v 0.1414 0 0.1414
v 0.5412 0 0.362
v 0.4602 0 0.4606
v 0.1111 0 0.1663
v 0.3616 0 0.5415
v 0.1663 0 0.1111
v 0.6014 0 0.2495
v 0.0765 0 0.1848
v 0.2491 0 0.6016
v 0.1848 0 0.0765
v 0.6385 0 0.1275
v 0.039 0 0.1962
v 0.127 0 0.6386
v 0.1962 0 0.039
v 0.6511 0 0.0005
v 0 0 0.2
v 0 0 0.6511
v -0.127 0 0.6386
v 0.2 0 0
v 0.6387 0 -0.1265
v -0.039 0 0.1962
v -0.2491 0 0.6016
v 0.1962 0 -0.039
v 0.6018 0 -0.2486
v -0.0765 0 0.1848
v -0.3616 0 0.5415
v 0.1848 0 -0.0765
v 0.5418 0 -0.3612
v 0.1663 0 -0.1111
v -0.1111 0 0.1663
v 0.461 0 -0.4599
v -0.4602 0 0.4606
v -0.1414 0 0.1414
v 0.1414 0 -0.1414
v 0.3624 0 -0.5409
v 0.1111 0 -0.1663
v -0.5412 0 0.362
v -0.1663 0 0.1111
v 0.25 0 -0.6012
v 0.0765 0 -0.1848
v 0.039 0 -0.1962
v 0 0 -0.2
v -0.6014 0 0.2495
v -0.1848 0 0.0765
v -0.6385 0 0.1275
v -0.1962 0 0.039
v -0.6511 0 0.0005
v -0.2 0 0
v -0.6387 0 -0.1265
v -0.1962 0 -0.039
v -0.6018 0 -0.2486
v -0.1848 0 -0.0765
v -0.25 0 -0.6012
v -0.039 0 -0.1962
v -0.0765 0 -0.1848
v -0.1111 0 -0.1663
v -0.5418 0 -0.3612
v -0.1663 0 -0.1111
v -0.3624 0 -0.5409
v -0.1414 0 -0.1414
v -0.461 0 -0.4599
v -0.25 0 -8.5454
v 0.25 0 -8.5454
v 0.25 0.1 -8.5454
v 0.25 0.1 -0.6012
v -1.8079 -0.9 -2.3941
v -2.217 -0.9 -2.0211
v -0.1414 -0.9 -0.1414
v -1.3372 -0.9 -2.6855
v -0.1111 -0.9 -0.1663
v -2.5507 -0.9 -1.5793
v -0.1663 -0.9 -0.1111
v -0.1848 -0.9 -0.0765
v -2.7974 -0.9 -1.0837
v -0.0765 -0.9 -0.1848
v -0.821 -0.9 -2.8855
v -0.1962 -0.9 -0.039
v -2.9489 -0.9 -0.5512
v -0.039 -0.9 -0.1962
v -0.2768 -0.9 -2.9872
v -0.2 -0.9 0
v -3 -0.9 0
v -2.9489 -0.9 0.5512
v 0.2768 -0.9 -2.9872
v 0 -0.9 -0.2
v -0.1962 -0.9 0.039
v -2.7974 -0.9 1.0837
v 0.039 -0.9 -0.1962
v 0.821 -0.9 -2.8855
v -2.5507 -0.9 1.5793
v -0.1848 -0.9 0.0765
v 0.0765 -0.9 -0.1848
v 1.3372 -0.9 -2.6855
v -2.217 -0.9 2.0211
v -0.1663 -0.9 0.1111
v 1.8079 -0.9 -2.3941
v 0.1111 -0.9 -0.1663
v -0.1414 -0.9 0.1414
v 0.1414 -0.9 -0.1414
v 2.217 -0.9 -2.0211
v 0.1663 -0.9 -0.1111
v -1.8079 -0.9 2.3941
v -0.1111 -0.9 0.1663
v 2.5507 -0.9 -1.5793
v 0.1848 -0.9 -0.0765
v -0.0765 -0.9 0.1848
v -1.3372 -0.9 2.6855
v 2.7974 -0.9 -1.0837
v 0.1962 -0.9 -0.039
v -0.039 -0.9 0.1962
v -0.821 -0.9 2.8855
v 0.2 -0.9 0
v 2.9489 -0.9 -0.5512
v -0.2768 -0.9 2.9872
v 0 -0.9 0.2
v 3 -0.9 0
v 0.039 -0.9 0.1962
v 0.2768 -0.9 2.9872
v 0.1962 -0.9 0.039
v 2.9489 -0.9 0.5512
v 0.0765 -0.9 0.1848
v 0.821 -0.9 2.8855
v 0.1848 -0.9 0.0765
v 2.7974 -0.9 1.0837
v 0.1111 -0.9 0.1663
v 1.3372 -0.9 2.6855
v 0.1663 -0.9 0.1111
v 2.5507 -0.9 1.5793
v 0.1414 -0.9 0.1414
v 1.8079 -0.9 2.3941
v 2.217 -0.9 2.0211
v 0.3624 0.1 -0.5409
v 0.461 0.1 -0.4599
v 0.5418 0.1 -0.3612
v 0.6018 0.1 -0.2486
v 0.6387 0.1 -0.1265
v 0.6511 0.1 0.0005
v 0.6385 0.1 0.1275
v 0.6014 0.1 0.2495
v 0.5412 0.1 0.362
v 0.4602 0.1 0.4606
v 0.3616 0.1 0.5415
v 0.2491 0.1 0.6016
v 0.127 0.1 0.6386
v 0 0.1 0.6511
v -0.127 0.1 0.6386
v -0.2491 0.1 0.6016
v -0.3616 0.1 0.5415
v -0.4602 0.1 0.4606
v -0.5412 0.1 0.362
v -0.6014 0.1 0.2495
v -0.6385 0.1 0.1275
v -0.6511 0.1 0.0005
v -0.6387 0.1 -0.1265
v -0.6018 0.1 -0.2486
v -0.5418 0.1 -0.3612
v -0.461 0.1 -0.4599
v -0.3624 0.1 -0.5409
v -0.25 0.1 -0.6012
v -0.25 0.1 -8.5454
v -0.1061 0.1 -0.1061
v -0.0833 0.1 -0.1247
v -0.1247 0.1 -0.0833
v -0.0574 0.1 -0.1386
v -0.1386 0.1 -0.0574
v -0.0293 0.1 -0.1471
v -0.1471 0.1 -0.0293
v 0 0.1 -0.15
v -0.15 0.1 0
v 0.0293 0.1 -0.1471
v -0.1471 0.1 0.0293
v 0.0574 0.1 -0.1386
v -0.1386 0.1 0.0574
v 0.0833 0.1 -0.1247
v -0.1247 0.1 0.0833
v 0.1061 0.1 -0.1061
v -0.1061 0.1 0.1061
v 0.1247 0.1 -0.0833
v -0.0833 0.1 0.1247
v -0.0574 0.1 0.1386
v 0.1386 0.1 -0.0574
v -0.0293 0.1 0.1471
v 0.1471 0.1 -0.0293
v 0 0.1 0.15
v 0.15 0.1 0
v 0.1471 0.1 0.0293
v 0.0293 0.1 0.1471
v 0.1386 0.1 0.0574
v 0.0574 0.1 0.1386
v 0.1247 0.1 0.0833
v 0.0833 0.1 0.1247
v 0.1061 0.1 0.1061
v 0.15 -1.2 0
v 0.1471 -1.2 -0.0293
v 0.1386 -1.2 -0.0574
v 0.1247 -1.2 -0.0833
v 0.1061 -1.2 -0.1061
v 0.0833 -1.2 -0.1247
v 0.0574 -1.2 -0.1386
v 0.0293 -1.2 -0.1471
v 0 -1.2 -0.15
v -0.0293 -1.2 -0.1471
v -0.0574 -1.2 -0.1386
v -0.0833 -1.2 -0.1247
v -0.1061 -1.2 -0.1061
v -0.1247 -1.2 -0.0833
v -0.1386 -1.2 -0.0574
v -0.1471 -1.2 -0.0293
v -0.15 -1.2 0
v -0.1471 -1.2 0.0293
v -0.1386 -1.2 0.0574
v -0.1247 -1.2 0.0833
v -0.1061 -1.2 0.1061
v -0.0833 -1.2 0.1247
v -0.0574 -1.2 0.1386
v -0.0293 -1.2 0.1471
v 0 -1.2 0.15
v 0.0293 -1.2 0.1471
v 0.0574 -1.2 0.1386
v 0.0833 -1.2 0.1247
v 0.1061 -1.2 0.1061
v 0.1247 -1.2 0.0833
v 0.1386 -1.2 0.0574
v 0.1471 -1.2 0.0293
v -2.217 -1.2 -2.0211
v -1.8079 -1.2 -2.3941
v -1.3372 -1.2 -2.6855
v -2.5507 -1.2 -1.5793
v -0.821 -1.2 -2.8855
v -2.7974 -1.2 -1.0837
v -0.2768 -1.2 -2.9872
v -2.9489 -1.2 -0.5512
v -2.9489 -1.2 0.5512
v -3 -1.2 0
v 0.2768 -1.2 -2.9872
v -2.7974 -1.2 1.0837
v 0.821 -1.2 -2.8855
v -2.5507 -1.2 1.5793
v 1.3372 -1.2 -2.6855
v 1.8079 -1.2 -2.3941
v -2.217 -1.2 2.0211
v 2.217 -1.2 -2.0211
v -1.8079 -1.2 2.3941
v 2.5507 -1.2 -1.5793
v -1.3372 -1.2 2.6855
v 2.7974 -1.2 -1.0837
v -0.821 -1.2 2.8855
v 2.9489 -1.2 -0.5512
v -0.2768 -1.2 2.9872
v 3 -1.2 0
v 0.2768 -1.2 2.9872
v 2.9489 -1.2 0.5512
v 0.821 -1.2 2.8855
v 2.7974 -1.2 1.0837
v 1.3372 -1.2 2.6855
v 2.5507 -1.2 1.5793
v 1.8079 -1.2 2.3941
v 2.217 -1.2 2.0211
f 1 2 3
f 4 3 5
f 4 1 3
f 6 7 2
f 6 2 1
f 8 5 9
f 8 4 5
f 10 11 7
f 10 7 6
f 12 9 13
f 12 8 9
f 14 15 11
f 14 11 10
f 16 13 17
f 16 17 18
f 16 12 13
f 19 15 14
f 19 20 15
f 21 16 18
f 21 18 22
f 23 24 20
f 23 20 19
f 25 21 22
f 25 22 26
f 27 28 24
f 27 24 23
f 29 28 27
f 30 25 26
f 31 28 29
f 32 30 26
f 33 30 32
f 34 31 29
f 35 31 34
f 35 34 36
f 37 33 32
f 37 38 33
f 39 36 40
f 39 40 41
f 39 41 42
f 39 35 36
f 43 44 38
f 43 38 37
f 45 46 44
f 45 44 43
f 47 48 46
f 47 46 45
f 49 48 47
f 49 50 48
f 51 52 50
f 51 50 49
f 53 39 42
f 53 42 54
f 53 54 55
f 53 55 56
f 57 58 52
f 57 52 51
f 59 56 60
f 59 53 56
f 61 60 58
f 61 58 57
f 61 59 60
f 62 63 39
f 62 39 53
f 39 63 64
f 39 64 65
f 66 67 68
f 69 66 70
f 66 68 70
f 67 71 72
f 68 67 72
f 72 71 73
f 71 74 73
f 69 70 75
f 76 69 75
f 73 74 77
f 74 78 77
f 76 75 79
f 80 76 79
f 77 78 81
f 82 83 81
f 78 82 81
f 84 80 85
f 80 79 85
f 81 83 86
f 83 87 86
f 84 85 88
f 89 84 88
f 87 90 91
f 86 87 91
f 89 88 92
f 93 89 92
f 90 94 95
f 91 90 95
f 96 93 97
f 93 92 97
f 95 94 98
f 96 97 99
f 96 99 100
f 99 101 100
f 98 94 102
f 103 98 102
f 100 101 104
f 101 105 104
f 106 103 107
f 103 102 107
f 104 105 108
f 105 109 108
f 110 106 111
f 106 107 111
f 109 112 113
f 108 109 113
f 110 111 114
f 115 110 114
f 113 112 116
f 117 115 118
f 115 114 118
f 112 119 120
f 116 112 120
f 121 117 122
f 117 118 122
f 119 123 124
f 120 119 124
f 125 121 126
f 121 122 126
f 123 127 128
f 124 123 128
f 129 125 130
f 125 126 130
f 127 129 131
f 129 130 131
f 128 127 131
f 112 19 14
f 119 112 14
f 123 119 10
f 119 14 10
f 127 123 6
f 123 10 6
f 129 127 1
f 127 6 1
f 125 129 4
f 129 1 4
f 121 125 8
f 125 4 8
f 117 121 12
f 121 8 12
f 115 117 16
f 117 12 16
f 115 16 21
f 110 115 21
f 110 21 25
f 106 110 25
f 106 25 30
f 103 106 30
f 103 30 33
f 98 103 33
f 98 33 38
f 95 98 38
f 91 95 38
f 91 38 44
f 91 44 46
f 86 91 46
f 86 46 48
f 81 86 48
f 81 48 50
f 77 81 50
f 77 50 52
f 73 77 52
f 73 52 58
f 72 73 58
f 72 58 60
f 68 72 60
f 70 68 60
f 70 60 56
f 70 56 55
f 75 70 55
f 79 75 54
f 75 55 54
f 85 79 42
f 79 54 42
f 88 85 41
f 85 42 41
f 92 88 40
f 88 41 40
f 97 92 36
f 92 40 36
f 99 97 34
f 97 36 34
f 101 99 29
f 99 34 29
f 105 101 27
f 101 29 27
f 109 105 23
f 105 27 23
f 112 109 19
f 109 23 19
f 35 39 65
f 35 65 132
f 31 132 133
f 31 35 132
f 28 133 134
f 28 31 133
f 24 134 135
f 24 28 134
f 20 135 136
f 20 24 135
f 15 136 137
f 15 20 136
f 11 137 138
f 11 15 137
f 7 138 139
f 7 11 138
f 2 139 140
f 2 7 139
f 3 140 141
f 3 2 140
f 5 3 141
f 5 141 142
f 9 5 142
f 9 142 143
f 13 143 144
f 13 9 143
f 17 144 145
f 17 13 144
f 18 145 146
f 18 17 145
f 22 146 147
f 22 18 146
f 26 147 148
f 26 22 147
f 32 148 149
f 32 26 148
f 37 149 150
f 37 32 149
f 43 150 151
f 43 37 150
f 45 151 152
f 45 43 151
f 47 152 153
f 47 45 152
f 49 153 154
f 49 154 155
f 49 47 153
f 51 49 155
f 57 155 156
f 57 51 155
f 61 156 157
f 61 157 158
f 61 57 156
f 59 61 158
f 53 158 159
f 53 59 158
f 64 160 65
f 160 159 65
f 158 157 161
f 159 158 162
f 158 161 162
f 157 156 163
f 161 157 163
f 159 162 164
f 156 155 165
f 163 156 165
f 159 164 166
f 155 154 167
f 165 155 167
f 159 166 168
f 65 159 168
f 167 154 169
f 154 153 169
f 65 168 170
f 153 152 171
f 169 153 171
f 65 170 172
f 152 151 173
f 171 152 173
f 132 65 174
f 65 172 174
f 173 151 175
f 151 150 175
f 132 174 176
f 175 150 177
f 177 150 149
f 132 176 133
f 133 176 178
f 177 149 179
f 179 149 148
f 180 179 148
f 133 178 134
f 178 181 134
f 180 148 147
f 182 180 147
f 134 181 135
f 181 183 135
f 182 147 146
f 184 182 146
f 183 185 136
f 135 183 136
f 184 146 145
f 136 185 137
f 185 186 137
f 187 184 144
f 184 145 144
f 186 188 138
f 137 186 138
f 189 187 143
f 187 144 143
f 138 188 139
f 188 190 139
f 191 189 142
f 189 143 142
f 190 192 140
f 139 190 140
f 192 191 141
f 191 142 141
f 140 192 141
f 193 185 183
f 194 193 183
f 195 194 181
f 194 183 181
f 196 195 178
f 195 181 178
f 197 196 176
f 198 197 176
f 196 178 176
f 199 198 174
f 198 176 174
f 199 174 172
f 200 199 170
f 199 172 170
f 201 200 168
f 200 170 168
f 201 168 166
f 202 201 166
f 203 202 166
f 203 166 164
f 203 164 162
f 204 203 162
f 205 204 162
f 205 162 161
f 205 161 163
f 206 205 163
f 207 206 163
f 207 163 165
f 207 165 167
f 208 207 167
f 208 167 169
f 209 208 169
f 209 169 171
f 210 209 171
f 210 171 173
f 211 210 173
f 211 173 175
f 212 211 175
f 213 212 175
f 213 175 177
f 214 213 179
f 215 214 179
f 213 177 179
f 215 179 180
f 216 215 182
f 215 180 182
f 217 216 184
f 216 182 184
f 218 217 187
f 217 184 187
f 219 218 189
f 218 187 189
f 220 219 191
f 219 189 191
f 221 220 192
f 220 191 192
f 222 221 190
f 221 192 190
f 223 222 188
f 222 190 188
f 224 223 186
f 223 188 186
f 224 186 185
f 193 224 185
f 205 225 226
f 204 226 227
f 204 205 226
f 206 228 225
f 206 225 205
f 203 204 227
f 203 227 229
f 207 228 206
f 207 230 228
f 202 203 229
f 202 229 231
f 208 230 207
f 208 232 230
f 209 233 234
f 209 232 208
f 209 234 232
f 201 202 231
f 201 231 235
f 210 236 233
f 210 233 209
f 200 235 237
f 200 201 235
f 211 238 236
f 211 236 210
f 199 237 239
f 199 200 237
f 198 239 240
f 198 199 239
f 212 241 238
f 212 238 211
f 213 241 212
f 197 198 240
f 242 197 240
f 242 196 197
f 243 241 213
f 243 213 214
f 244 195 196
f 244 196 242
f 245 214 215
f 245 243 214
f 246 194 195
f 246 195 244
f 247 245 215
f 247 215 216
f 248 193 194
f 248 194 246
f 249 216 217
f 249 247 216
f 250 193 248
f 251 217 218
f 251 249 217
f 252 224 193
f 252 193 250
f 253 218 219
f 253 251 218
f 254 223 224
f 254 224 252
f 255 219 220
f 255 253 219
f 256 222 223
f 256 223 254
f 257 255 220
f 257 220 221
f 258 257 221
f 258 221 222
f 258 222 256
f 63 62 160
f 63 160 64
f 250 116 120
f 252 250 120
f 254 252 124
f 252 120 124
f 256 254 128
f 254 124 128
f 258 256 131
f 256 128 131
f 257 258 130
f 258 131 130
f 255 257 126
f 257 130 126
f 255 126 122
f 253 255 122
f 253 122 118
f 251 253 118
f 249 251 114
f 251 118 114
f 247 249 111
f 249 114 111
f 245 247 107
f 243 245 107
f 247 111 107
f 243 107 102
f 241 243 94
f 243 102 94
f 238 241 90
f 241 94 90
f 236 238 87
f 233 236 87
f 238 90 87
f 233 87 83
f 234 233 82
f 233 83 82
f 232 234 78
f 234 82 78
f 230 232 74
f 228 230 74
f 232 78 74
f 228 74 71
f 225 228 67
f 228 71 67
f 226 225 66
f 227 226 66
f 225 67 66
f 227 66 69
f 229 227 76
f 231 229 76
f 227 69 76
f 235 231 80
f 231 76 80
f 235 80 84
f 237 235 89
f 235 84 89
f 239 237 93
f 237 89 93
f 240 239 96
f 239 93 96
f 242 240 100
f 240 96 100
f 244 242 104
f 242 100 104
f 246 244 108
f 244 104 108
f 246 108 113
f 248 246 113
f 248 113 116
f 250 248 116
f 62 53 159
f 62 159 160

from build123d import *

# Parameters (mm, degrees)
BOSS_EXTRUDE1_DEPTH = 0.1
SKETCH2_R           = 0.2
BOSS_EXTRUDE2_DEPTH = 1
SKETCH3_R           = 3
BOSS_EXTRUDE3_DEPTH = 0.3
SKETCH4_R           = 0.15
CUT_EXTRUDE1_DEPTH  = 2.3


with BuildPart() as part:
    # Sketch1 → Boss-Extrude1 (new body)
    with BuildSketch(Plane(origin=(0, 0, 0), x_dir=(1, 0, 0), z_dir=(0, 1, 0))):
        with BuildLine():
            Line((-0.25, 8.545435606), (0.25, 8.545435606))
            Line((0.25, 8.545435606), (0.25, 0.601234649))
            ThreePointArc((0.25, 0.601234649), (0, -0.651139849), (-0.25, 0.601234649))
            Line((-0.25, 0.601234649), (-0.25, 8.545435606))
        make_face()
    extrude(amount=BOSS_EXTRUDE1_DEPTH)

    # Sketch2 → Boss-Extrude2 (add)
    with BuildSketch(Plane.XZ.offset(-0.1)):
        Circle(SKETCH2_R)
    extrude(amount=BOSS_EXTRUDE2_DEPTH)

    # Sketch3 → Boss-Extrude3 (add)
    with BuildSketch(Plane.XZ.offset(0.9)):
        Circle(SKETCH3_R)
    extrude(amount=BOSS_EXTRUDE3_DEPTH)

    # Sketch4 → Cut-Extrude1 (cut, through all)
    with BuildSketch(Plane(origin=(0, 0.1, 0), x_dir=(1, 0, 0), z_dir=(0, 1, 0))):
        Circle(SKETCH4_R)
    extrude(amount=-CUT_EXTRUDE1_DEPTH, mode=Mode.SUBTRACT)


solid = part.part
